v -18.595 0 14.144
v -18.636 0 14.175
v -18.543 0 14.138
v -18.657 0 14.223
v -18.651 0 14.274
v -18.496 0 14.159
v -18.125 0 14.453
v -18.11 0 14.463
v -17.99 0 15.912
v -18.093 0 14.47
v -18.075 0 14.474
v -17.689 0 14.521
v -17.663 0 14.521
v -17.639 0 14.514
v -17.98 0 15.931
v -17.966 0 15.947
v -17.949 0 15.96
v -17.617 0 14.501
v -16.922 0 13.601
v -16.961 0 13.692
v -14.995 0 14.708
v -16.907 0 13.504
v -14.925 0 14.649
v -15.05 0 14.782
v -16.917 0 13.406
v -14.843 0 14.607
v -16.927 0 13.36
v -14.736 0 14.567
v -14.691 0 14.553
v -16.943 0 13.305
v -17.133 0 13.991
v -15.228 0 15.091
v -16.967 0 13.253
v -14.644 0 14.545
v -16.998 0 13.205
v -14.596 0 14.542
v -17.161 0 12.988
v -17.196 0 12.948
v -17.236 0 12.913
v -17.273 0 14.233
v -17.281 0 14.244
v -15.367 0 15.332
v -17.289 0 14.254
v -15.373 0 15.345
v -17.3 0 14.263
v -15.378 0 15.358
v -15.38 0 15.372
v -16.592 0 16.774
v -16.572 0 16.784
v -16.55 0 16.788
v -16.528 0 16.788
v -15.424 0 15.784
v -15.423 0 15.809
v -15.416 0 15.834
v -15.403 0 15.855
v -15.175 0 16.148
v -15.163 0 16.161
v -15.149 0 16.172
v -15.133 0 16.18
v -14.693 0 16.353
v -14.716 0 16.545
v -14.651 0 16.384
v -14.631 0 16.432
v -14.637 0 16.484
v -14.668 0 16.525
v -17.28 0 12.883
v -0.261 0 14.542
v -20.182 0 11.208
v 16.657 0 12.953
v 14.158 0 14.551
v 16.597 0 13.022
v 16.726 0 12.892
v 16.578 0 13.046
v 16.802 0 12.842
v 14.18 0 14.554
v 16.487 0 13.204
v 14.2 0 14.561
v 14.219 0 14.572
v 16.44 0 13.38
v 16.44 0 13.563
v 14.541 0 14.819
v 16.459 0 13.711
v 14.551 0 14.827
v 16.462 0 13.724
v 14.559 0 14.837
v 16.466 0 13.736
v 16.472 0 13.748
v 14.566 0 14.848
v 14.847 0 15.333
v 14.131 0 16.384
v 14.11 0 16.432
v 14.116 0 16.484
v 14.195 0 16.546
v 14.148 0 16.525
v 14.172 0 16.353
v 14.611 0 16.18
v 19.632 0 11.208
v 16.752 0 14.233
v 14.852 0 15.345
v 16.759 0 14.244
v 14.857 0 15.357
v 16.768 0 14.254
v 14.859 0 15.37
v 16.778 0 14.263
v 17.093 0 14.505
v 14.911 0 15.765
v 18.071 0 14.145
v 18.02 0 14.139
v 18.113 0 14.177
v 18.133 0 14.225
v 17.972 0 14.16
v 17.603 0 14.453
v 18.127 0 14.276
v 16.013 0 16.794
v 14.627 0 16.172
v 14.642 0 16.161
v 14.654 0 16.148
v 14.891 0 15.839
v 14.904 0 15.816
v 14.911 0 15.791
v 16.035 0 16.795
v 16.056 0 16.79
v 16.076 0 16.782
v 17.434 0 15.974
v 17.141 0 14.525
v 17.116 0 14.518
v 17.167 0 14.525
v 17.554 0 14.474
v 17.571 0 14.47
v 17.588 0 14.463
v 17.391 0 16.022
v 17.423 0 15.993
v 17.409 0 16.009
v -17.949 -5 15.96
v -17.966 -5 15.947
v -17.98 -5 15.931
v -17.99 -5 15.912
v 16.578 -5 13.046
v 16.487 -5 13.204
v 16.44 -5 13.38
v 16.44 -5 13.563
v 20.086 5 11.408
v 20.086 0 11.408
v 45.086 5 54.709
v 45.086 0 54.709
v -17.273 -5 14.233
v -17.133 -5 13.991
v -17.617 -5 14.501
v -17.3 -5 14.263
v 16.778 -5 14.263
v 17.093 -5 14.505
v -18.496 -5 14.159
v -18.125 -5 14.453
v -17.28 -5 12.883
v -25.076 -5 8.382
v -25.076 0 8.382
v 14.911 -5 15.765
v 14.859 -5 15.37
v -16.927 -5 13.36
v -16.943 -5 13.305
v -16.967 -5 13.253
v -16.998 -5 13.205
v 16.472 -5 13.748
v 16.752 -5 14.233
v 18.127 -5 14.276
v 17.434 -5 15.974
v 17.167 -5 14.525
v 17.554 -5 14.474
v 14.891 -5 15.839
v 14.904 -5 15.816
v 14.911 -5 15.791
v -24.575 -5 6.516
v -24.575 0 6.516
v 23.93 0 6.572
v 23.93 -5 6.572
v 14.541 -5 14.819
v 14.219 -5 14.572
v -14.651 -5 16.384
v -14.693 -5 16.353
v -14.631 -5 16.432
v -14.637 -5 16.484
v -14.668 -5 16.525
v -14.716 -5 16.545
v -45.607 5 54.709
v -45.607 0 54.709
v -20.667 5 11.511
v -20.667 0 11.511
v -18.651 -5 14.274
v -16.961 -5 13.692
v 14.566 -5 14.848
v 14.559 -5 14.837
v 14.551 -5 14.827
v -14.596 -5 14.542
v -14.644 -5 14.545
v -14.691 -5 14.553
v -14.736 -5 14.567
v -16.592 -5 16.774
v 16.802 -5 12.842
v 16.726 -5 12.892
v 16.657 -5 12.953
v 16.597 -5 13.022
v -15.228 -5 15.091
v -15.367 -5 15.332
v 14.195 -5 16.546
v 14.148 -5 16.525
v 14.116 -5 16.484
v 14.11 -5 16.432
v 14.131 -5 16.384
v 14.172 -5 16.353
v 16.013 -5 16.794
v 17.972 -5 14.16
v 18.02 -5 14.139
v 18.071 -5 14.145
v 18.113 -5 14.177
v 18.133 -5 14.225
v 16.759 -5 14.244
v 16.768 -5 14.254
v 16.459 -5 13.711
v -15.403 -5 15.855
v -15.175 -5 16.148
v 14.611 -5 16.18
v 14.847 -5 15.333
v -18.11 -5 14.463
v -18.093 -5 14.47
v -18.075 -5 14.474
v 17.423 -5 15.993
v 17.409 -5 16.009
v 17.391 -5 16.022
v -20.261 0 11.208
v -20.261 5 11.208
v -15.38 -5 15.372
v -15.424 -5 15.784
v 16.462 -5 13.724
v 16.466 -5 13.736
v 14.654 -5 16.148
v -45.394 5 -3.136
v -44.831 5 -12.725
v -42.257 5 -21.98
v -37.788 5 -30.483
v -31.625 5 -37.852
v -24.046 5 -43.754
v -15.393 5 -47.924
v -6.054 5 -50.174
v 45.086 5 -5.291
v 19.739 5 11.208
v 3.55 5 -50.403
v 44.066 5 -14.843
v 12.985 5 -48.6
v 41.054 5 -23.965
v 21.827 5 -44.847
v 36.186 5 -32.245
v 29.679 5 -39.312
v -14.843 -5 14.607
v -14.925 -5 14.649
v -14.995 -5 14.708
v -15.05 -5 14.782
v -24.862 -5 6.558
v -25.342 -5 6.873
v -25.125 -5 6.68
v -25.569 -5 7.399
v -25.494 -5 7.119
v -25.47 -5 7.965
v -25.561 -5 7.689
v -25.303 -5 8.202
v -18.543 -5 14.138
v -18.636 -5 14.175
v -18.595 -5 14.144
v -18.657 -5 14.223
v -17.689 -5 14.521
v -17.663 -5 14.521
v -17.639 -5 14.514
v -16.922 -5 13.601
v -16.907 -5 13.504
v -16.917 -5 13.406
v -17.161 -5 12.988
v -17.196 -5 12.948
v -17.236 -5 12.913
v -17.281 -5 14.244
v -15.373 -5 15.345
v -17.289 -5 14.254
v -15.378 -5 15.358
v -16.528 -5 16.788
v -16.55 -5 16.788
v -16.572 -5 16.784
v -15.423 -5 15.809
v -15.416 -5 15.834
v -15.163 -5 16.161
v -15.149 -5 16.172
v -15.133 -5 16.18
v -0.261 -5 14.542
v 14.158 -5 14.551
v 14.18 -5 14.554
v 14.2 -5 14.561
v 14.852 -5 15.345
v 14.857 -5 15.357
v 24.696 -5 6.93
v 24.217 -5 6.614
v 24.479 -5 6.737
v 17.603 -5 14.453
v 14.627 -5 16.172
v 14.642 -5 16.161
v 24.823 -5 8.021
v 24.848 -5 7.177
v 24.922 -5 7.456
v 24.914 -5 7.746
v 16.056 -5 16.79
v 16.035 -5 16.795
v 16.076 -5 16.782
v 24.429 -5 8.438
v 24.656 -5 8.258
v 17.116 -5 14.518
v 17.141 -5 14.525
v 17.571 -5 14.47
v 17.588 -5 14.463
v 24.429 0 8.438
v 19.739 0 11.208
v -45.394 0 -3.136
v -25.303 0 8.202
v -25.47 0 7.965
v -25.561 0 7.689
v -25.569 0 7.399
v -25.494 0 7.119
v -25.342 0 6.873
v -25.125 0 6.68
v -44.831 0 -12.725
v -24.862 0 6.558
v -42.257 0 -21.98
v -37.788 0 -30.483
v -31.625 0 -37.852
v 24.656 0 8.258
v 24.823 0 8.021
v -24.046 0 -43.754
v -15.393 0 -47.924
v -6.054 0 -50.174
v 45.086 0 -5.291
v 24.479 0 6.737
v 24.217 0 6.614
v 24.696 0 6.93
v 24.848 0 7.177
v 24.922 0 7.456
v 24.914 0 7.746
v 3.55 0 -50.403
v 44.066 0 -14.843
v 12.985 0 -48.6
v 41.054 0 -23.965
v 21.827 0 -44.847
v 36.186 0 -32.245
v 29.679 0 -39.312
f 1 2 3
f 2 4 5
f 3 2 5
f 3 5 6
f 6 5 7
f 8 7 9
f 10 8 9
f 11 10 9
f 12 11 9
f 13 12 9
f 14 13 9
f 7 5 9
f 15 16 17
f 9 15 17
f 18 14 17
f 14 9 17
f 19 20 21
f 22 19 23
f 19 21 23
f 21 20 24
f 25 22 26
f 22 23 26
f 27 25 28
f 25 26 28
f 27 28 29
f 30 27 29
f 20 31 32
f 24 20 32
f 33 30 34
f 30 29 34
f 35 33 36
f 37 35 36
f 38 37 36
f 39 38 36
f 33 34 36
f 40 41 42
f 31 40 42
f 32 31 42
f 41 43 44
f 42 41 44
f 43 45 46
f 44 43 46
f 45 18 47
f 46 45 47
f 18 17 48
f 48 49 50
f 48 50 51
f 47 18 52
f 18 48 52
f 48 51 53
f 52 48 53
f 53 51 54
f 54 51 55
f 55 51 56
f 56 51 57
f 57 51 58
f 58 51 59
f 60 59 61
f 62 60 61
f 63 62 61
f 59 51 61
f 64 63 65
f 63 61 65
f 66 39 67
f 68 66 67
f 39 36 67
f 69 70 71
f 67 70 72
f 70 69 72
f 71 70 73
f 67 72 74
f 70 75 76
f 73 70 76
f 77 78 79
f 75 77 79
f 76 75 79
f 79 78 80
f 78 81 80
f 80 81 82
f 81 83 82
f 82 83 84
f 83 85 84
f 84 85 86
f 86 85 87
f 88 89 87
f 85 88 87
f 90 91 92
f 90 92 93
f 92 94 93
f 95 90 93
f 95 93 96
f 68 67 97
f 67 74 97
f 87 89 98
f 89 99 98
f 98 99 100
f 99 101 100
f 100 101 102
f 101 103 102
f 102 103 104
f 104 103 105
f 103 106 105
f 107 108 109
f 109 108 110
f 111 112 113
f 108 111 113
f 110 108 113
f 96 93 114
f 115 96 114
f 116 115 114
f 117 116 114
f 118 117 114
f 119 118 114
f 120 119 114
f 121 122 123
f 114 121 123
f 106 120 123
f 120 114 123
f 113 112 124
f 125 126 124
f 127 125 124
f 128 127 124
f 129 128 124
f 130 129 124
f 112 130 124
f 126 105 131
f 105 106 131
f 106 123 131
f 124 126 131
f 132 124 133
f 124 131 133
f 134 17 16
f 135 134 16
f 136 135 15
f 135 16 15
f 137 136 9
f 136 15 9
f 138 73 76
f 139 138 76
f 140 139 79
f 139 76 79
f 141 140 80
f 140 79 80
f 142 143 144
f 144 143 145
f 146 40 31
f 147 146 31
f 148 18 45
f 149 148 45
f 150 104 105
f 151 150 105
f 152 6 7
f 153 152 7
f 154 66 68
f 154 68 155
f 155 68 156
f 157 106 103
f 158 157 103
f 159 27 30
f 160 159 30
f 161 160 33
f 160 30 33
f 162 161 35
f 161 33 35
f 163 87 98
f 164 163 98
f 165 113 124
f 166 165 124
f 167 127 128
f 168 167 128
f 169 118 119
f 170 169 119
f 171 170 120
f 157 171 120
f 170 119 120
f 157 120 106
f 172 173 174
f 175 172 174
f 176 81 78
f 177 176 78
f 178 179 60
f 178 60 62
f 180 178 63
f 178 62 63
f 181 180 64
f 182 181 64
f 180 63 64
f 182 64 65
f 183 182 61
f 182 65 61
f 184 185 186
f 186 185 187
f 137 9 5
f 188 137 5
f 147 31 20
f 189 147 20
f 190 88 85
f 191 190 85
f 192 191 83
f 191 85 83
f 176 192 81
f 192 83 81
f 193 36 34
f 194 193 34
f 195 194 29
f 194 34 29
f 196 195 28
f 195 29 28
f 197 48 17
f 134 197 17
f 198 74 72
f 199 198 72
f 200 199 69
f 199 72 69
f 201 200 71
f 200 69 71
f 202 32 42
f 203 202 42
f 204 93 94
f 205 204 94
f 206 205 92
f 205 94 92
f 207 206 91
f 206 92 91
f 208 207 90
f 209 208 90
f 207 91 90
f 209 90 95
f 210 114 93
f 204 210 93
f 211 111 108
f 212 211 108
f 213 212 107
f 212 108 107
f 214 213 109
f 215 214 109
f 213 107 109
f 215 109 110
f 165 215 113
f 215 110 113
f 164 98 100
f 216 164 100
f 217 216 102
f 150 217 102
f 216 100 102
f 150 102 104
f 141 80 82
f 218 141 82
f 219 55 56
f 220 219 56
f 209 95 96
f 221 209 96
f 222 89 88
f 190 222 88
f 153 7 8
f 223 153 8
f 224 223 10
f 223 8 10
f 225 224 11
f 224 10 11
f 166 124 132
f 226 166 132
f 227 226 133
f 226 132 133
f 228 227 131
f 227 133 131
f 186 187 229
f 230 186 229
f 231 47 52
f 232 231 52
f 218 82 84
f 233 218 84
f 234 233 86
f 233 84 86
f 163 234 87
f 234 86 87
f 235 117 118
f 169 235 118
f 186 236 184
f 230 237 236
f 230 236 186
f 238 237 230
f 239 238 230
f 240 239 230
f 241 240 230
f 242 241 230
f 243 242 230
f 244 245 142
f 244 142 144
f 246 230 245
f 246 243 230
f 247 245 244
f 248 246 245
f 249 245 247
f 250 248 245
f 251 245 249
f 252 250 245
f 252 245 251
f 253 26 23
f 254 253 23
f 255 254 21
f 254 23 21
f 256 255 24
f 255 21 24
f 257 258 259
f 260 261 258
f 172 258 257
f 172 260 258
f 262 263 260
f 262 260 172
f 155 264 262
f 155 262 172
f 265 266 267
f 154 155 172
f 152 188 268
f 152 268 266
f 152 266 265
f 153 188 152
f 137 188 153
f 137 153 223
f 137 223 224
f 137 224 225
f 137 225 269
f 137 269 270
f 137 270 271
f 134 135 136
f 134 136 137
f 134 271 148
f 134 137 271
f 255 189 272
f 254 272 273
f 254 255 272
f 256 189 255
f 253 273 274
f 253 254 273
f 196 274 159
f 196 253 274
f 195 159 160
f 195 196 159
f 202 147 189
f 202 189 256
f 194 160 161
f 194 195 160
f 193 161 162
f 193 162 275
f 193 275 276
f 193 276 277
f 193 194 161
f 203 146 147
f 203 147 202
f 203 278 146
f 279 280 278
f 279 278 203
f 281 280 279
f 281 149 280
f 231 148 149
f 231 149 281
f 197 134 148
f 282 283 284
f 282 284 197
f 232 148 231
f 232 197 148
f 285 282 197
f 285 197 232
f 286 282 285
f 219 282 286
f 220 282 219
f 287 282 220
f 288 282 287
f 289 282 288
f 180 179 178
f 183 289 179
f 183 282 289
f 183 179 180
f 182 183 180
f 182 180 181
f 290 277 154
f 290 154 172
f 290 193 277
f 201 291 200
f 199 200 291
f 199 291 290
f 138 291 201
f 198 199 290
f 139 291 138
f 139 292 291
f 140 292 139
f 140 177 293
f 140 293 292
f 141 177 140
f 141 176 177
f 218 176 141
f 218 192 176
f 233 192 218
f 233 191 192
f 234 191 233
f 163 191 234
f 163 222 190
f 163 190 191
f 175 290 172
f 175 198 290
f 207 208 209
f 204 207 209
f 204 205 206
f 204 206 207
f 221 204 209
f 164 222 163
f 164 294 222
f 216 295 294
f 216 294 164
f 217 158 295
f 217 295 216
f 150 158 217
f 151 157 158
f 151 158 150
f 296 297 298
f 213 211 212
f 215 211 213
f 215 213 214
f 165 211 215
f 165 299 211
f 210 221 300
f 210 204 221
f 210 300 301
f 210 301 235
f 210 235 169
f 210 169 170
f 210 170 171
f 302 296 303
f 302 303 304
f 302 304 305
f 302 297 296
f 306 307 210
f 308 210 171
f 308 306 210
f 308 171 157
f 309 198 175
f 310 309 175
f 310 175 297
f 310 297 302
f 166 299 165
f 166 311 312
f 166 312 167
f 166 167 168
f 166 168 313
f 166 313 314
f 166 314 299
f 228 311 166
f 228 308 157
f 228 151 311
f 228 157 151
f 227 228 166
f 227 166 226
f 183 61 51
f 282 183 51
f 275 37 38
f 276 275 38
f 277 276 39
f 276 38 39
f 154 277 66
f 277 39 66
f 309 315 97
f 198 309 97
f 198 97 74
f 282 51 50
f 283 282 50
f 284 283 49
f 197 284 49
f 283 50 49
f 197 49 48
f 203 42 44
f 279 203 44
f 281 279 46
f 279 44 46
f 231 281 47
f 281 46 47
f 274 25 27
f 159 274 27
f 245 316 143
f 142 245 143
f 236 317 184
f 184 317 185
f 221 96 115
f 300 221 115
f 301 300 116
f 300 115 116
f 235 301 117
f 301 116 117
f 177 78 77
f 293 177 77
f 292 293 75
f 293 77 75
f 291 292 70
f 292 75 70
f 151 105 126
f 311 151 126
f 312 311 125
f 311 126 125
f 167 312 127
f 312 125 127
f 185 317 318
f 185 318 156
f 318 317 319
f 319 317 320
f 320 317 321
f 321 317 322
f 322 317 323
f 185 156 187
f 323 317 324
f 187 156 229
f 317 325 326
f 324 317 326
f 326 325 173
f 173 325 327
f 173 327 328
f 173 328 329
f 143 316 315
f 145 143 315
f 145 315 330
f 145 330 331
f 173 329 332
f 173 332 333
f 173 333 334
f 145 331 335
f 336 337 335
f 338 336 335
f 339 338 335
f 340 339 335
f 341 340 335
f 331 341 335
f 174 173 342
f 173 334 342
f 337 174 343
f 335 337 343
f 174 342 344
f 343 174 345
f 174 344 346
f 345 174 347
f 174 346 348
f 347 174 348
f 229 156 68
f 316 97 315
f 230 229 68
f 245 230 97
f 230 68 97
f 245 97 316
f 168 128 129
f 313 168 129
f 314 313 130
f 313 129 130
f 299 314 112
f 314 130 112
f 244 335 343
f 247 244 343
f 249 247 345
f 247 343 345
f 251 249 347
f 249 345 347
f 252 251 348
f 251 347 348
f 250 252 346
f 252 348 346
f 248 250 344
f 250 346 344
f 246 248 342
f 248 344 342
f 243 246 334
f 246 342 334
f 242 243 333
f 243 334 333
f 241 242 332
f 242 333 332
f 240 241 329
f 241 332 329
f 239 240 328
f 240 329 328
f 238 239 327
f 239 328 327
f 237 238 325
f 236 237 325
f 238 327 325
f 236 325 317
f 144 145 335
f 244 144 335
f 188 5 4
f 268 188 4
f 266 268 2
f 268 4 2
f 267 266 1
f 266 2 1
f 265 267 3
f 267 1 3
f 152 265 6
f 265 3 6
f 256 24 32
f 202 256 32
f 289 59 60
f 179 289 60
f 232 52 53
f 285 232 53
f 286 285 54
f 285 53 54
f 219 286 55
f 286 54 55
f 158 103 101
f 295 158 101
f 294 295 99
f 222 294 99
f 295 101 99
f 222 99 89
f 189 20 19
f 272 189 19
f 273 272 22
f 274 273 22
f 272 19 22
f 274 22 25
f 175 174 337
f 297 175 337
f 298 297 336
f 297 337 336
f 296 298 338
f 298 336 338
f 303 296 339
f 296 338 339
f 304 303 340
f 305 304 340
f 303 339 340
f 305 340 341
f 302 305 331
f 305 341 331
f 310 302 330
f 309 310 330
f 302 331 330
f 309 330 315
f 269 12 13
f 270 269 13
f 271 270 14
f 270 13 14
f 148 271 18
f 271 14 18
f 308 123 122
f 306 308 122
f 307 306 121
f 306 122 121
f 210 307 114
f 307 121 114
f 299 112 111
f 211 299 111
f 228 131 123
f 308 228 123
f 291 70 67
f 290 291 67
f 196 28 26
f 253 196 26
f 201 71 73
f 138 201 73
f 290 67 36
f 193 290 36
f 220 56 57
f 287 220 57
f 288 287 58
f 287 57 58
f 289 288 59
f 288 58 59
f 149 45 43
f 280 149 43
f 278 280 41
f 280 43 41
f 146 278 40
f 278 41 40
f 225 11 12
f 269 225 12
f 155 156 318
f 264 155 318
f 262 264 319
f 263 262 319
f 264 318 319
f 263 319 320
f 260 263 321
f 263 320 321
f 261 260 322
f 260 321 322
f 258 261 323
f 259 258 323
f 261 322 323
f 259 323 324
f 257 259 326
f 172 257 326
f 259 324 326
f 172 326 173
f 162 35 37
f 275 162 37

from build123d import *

# Parameters (mm, degrees)
BOSS_EXTRU_1_DEPTH = 5
BOSS_EXTRU_2_DEPTH = 5


with BuildPart() as part:
    # Esquisse1 → Boss.-Extru.1 (new body)
    with BuildSketch(Plane(origin=(0, 0, 0), x_dir=(1, 0, 0), z_dir=(0, 1, 0))):
        with BuildLine():
            Line((-45.607160176, -54.708924596), (-20.666600132, -11.510607431))
            Line((-20.666600132, -11.510607431), (-20.260750016, -11.207654407))
            Line((-20.260750016, -11.207654407), (-0.260750016, -11.207654407))
            Line((-0.260750016, -11.207654407), (19.739249984, -11.207654407))
            Line((19.739249984, -11.207654407), (20.085660146, -11.407654407))
            Line((20.085660146, -11.407654407), (45.085660146, -54.708924596))
            Line((45.085660146, -54.708924596), (45.085660146, 5.291075404))
            ThreePointArc((45.085660146, 5.291075404), (-1.258158233, 50.543971712), (-45.394459717, 3.135522912))
            Line((-45.394459717, 3.135522912), (-45.607160176, -54.708924596))
        make_face()
    extrude(amount=BOSS_EXTRU_1_DEPTH)

    # Esquisse3 → Boss.-Extru.2 (add)
    with BuildSketch(Plane.XZ):
        with BuildLine():
            Line((-17.273069059, 14.232839193), (-17.133250941, 13.990667109))
            Line((-17.133250941, 13.990667109), (-16.960798401, 13.691970548))
            ThreePointArc((-16.960798401, 13.691970548), (-16.911924508, 13.553212004), (-16.916519184, 13.406169561))
            Line((-16.916519184, 13.406169561), (-16.926742719, 13.359617338))
            ThreePointArc((-16.926742719, 13.359617338), (-16.954040192, 13.27824679), (-16.998068041, 13.204572733))
            Line((-16.998068041, 13.204572733), (-17.161029392, 12.988484086))
            ThreePointArc((-17.161029392, 12.988484086), (-17.215401514, 12.92969778), (-17.280393449, 12.882919517))
            Line((-17.280393449, 12.882919517), (-25.076017394, 8.382113933))
            ThreePointArc((-25.076017394, 8.382113933), (-25.541793777, 7.256712395), (-24.574863823, 6.516089195))
            Line((-24.574863823, 6.516089195), (23.930288039, 6.572043384))
            ThreePointArc((23.930288039, 6.572043384), (24.895209417, 7.313780849), (24.429134468, 8.438068122))
            Line((24.429134468, 8.438068122), (16.801950366, 12.841624917))
            ThreePointArc((16.801950366, 12.841624917), (16.690408296, 12.921554834), (16.596603028, 13.021709699))
            Line((16.596603028, 13.021709699), (16.578320724, 13.045535661))
            ThreePointArc((16.578320724, 13.045535661), (16.457519984, 13.29049533), (16.43965666, 13.563036996))
            Line((16.43965666, 13.563036996), (16.459154582, 13.711138423))
            ThreePointArc((16.459154582, 13.711138423), (16.463606056, 13.73022975), (16.471696528, 13.748085804))
            Line((16.471696528, 13.748085804), (16.751805291, 14.233248413))
            ThreePointArc((16.751805291, 14.233248413), (16.763223851, 14.249182995), (16.777531689, 14.262583747))
            Line((16.777531689, 14.262583747), (17.093212954, 14.504814501))
            ThreePointArc((17.093212954, 14.504814501), (17.128207192, 14.52207175), (17.167141716, 14.524623654))
            Line((17.167141716, 14.524623654), (17.553917324, 14.473703679))
            ThreePointArc((17.553917324, 14.473703679), (17.57989783, 14.466626641), (17.603048157, 14.452874058))
            Line((17.603048157, 14.452874058), (17.97191114, 14.159990026))
            ThreePointArc((17.97191114, 14.159990026), (18.094102127, 14.158310543), (18.126681115, 14.276090284))
            Line((18.126681115, 14.276090284), (17.433945609, 15.973517991))
            ThreePointArc((17.433945609, 15.973517991), (17.416714959, 16.001470658), (17.391359086, 16.02233514))
            Line((17.391359086, 16.02233514), (16.076159754, 16.781665828))
            ThreePointArc((16.076159754, 16.781665828), (16.045420057, 16.793190963), (16.012604566, 16.794140313))
            Line((16.012604566, 16.794140313), (14.195418018, 16.545522578))
            ThreePointArc((14.195418018, 16.545522578), (14.109691574, 16.458410399), (14.172267612, 16.353425666))
            Line((14.172267612, 16.353425666), (14.611112944, 16.18025755))
            ThreePointArc((14.611112944, 16.18025755), (14.63461266, 16.167083269), (14.653742684, 16.148113806))
            Line((14.653742684, 16.148113806), (14.891219551, 15.838627928))
            ThreePointArc((14.891219551, 15.838627928), (14.908476799, 15.80363369), (14.911028703, 15.764699166))
            Line((14.911028703, 15.764699166), (14.859091349, 15.370195794))
            ThreePointArc((14.859091349, 15.370195794), (14.854639876, 15.351104467), (14.846549403, 15.333248413))
            Line((14.846549403, 15.333248413), (14.56644064, 14.848085804))
            ThreePointArc((14.56644064, 14.848085804), (14.55502208, 14.832151222), (14.540714242, 14.81875047))
            Line((14.540714242, 14.81875047), (14.219073364, 14.571946743))
            ThreePointArc((14.219073364, 14.571946743), (14.190371735, 14.556599446), (14.158261785, 14.551282098))
            Line((14.158261785, 14.551282098), (-0.260750016, 14.541972588))
            Line((-0.260750016, 14.541972588), (-14.596285983, 14.541972588))
            ThreePointArc((-14.596285983, 14.541972588), (-14.667470827, 14.548357651), (-14.736383073, 14.567308998))
            Line((-14.736383073, 14.567308998), (-14.843485058, 14.607357396))
            ThreePointArc((-14.843485058, 14.607357396), (-14.96184332, 14.676732873), (-15.04979813, 14.782020985))
            Line((-15.04979813, 14.782020985), (-15.227995052, 15.090667109))
            Line((-15.227995052, 15.090667109), (-15.367372917, 15.332076652))
            ThreePointArc((-15.367372917, 15.332076652), (-15.375872662, 15.351164592), (-15.380220287, 15.371602138))
            Line((-15.380220287, 15.371602138), (-15.423614857, 15.783610378))
            ThreePointArc((-15.423614857, 15.783610378), (-15.420323499, 15.821535446), (-15.403097384, 15.855482533))
            Line((-15.403097384, 15.855482533), (-15.175198809, 16.148467569))
            ThreePointArc((-15.175198809, 16.148467569), (-15.156172757, 16.167140053), (-15.132889445, 16.180122335))
            Line((-15.132889445, 16.180122335), (-14.693034359, 16.353238171))
            ThreePointArc((-14.693034359, 16.353238171), (-14.630388491, 16.458360263), (-14.716399441, 16.54540781))
            Line((-14.716399441, 16.54540781), (-16.527659803, 16.78768329))
            ThreePointArc((-16.527659803, 16.78768329), (-16.561160911, 16.786495707), (-16.59238723, 16.774303432))
            Line((-16.59238723, 16.774303432), (-17.948561264, 15.96017176))
            ThreePointArc((-17.948561264, 15.96017176), (-17.973134754, 15.939376465), (-17.98982791, 15.911851216))
            Line((-17.98982791, 15.911851216), (-18.650555766, 14.274264265))
            ThreePointArc((-18.650555766, 14.274264265), (-18.617642424, 14.156714797), (-18.495586228, 14.158572299))
            Line((-18.495586228, 14.158572299), (-18.125279987, 14.452988106))
            ThreePointArc((-18.125279987, 14.452988106), (-18.101637875, 14.466966469), (-18.075084648, 14.473985744))
            Line((-18.075084648, 14.473985744), (-17.688740592, 14.520834995))
            ThreePointArc((-17.688740592, 14.520834995), (-17.650765358, 14.518139993), (-17.616549402, 14.501447188))
            Line((-17.616549402, 14.501447188), (-17.299518527, 14.262724159))
            ThreePointArc((-17.299518527, 14.262724159), (-17.284787821, 14.249114525), (-17.273069059, 14.232839193))
        make_face()
    extrude(amount=BOSS_EXTRU_2_DEPTH)


solid = part.part
